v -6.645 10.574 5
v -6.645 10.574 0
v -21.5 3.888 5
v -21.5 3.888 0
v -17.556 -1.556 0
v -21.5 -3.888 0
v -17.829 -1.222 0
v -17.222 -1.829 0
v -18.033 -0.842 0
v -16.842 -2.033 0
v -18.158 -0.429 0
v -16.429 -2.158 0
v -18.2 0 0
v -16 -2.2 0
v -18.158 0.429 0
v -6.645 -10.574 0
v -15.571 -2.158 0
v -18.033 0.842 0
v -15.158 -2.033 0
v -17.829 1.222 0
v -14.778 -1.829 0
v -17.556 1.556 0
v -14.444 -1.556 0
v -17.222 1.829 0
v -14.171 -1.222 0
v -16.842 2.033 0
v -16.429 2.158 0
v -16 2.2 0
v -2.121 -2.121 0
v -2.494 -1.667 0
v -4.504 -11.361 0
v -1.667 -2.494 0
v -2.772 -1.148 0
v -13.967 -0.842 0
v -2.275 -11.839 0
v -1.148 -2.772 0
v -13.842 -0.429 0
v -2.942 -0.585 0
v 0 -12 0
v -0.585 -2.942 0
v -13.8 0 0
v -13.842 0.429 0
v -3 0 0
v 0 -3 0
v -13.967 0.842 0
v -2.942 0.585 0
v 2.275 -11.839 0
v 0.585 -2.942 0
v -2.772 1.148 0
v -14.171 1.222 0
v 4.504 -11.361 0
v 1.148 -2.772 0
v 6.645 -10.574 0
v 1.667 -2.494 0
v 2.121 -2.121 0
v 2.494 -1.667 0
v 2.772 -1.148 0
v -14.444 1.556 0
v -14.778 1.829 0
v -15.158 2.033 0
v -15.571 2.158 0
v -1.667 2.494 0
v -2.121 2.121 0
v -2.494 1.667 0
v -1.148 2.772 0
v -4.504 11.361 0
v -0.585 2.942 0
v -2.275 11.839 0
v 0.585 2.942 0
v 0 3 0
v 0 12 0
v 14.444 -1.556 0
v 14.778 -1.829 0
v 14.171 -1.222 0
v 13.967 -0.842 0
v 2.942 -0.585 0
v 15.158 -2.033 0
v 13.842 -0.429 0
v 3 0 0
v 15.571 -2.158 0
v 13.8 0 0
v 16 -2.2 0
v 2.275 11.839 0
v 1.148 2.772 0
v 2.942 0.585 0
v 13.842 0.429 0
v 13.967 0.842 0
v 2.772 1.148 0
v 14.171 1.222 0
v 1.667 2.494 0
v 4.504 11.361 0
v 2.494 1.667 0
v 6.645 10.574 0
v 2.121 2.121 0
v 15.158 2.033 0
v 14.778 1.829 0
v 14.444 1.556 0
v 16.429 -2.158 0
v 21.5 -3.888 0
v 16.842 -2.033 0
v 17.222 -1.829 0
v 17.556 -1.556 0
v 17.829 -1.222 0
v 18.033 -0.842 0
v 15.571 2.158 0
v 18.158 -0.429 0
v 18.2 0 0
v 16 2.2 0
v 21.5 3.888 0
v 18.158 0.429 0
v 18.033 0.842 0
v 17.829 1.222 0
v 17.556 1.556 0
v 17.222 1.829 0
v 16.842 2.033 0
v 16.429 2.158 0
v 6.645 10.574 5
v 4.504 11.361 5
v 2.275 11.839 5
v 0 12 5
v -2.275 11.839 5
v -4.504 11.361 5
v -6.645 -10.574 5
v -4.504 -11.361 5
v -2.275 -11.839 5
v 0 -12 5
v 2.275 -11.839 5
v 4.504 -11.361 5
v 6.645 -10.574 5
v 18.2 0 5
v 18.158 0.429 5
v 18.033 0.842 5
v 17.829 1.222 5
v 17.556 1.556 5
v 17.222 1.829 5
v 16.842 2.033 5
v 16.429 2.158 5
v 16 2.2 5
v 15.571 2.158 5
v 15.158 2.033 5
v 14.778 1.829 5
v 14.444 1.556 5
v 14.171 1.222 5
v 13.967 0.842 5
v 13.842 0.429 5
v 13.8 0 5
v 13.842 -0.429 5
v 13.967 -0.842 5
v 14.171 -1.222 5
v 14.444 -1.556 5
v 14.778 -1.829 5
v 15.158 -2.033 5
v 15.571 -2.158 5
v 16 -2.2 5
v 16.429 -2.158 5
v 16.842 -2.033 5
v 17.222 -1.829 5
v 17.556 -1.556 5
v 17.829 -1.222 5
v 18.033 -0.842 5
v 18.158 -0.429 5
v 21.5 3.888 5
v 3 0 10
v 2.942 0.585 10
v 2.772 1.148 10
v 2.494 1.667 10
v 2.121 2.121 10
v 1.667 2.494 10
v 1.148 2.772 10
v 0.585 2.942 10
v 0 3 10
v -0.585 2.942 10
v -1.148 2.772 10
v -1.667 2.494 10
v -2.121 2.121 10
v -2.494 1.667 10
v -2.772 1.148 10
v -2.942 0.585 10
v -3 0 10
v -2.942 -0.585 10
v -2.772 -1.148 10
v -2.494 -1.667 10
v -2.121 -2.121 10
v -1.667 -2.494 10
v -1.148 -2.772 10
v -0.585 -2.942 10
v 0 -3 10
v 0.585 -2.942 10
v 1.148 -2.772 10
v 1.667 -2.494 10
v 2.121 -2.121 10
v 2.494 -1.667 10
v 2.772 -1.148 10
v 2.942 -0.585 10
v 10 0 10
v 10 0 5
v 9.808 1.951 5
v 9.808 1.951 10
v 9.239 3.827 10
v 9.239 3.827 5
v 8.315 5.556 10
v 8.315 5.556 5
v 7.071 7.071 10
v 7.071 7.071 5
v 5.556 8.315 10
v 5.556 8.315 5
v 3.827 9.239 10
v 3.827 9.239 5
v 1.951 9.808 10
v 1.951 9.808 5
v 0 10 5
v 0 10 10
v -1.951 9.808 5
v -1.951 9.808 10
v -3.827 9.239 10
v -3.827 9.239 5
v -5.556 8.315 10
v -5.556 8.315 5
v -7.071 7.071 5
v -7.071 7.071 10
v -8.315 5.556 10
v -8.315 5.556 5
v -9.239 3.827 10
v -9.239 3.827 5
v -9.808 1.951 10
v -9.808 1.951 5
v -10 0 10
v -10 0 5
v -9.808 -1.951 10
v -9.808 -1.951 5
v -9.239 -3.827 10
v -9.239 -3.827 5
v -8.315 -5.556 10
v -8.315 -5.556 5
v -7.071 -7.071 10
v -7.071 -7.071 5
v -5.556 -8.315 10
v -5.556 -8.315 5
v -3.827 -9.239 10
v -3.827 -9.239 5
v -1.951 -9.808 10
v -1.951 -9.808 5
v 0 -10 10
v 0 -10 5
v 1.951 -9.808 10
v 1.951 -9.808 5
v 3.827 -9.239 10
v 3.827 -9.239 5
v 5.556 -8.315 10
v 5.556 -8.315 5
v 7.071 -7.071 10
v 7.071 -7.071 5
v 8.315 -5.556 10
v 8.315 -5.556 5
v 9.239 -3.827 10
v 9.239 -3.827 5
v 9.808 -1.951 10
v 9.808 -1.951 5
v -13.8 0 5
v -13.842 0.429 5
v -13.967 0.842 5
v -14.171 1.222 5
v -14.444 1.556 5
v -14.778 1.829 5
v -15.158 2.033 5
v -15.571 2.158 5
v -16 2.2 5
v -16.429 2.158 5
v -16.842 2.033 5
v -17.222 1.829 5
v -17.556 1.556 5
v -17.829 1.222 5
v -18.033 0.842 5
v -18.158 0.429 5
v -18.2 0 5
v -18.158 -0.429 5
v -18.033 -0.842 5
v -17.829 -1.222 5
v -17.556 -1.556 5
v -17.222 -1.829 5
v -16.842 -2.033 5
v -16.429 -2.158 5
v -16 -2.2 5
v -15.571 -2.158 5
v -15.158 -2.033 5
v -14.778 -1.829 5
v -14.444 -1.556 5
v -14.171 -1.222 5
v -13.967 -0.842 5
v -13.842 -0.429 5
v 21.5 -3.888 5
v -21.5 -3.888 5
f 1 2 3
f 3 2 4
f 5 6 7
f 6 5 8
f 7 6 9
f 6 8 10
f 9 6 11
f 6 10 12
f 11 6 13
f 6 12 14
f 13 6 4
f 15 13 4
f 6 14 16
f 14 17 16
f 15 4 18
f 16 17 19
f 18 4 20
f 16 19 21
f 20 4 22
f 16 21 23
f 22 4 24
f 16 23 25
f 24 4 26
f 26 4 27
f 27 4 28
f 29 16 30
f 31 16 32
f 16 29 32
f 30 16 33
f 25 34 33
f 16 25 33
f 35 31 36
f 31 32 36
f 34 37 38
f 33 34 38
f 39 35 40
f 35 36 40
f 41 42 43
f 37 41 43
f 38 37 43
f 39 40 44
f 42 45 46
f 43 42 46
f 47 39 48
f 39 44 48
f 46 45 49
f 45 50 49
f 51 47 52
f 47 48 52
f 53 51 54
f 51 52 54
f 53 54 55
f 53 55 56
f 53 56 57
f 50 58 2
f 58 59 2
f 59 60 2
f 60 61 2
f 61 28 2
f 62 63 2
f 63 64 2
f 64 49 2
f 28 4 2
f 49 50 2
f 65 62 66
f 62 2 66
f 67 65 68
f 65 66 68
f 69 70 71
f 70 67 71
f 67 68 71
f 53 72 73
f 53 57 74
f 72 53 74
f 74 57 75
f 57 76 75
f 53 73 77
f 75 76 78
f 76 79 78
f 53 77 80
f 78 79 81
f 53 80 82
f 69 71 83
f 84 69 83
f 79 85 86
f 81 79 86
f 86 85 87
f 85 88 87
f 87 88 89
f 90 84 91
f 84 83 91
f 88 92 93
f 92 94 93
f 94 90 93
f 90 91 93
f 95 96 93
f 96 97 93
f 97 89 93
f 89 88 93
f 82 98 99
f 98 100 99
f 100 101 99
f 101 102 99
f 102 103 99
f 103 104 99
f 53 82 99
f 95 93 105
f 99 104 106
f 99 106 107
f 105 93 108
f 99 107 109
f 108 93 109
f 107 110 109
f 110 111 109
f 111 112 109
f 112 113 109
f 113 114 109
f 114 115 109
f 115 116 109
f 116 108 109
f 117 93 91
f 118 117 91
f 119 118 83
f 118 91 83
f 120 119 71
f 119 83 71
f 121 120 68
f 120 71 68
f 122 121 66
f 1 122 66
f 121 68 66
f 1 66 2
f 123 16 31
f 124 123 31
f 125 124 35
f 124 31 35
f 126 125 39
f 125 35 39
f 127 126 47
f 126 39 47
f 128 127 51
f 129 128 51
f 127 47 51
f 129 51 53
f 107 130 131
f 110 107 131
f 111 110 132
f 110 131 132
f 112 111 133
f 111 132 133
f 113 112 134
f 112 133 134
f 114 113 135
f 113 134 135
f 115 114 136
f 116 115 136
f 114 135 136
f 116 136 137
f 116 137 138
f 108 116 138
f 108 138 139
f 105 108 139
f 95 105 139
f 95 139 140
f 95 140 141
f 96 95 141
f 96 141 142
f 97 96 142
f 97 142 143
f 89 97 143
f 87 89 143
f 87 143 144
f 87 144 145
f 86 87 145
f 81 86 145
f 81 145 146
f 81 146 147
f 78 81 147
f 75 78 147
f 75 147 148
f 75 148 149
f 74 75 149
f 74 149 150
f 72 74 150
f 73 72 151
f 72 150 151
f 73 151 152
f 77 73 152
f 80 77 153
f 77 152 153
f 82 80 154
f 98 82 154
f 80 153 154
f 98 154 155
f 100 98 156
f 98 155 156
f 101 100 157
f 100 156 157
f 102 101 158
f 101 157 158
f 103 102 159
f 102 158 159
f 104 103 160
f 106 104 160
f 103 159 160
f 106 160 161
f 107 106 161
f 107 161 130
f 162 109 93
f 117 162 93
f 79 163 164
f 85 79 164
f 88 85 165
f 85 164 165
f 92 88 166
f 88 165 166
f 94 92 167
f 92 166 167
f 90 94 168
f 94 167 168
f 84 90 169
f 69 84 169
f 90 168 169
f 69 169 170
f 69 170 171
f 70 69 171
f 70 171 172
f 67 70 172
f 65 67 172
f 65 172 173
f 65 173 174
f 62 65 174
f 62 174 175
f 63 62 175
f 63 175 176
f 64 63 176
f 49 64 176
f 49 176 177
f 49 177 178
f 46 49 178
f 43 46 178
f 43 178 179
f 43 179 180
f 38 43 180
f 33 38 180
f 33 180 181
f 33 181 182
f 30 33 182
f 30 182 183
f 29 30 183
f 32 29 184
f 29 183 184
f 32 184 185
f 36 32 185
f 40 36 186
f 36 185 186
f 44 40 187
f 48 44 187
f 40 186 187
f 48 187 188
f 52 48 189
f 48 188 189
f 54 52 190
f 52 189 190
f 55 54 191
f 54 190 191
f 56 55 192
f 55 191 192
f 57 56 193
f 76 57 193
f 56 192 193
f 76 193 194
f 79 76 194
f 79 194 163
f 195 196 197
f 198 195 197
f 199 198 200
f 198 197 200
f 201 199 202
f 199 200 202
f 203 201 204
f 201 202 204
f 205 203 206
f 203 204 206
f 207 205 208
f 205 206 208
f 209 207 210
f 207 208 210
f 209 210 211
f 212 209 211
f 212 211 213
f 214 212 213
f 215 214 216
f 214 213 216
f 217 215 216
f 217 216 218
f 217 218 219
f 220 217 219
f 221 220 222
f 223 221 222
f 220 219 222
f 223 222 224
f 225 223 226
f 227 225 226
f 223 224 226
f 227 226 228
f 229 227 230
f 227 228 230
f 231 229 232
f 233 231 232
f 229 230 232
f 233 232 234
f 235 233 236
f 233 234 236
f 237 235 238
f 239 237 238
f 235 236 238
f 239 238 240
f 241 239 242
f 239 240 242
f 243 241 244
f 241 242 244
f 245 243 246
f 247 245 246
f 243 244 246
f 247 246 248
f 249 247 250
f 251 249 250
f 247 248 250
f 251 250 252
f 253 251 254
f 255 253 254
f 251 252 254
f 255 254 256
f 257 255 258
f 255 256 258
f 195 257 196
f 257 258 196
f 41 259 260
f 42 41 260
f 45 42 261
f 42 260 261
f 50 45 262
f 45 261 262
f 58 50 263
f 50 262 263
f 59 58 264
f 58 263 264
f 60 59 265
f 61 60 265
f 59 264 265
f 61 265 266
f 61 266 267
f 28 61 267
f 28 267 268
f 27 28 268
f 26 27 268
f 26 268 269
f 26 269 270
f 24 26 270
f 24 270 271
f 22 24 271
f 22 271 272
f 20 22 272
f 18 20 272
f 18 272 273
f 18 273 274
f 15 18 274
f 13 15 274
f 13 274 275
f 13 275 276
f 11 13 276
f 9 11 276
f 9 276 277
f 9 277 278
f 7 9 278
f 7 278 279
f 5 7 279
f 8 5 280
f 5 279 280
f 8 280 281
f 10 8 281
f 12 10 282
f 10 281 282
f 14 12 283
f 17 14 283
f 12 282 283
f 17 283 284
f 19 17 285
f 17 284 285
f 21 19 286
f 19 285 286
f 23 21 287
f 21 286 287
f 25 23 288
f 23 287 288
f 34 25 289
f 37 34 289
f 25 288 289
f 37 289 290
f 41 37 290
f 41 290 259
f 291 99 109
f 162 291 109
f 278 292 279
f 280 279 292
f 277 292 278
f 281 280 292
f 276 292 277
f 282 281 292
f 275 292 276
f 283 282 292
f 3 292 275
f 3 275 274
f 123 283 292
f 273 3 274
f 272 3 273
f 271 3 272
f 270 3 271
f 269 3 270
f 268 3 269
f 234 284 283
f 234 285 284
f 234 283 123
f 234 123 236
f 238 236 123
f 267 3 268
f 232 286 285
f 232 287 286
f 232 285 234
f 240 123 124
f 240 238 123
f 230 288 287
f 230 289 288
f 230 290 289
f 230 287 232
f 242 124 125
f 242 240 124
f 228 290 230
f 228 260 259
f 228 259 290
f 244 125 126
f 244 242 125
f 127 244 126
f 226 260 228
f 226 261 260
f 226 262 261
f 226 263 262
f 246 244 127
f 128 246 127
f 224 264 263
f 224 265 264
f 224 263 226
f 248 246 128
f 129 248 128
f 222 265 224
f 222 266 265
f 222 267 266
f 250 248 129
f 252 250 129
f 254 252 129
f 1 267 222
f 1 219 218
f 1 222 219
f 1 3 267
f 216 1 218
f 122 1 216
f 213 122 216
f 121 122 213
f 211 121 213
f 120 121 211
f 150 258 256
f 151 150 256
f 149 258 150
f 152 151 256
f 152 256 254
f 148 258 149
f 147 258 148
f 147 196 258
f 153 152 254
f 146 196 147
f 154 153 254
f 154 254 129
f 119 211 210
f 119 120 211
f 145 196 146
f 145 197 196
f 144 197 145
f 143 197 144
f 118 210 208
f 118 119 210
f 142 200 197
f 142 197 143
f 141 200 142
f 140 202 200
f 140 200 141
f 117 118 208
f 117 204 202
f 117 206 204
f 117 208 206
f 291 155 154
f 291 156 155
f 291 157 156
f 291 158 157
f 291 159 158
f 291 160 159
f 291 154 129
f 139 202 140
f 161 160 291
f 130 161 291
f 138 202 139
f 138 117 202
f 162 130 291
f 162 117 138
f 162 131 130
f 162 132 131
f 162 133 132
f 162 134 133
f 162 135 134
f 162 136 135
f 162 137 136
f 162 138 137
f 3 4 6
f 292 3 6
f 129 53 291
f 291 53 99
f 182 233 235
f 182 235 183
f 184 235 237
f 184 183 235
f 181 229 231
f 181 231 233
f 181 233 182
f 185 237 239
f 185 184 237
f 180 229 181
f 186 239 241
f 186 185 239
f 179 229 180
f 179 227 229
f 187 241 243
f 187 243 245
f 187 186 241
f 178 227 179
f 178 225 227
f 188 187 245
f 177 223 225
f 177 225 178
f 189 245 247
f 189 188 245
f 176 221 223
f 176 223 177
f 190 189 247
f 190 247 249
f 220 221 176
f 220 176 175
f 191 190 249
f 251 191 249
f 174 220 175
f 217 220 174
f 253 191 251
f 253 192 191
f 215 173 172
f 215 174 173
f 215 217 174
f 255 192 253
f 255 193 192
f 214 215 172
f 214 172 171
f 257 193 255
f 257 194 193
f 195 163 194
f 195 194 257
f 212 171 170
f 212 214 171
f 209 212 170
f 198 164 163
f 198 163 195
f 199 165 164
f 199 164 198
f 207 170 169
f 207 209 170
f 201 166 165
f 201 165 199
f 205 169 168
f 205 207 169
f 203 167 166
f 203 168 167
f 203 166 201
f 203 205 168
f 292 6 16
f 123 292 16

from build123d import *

# Parameters (mm, degrees)
PAD050_DEPTH = 5
SKETCH054_R  = 10
PAD051_DEPTH = 5
SKETCH055_R  = 2.2
HOLE_DEPTH   = 25
SKETCH056_R  = 3
POCKET_DEPTH = 10.001


with BuildPart() as part:
    # Sketch053 → Pad050 (new body)
    with BuildSketch(Plane.XY):
        with BuildLine():
            Line((-21.5, 3.888093), (-21.5, -3.888093))
            Line((-21.5, -3.888093), (-6.644741, -10.57367))
            ThreePointArc((-6.644741, -10.57367), (0, -12), (6.644741, -10.57367))
            Line((6.644741, -10.57367), (21.5, -3.888093))
            Line((21.5, -3.888093), (21.5, 3.888093))
            Line((21.5, 3.888093), (6.644741, 10.57367))
            ThreePointArc((6.644741, 10.57367), (0, 12), (-6.644741, 10.57367))
            Line((-6.644741, 10.57367), (-21.5, 3.888093))
        make_face()
    extrude(amount=PAD050_DEPTH)

    # Sketch054 (on Face10 of Pad050) → Pad051 (join)
    with BuildSketch(Plane.XY.offset(5)):
        Circle(SKETCH054_R)
    extrude(amount=PAD051_DEPTH)

    # Sketch055 (on Face10 of Pad050) → Hole (cut)
    with BuildSketch(Plane.XY.offset(5)):
        with Locations((-16, 0)):
            Circle(SKETCH055_R)
        with Locations((16, 0)):
            Circle(SKETCH055_R)
    extrude(amount=-HOLE_DEPTH, mode=Mode.SUBTRACT)

    # Sketch056 (on Face14 of Hole) → Pocket (cut, through all)
    with BuildSketch(Plane.XY.offset(10)):
        Circle(SKETCH056_R)
    extrude(amount=-POCKET_DEPTH, mode=Mode.SUBTRACT)


solid = part.part
